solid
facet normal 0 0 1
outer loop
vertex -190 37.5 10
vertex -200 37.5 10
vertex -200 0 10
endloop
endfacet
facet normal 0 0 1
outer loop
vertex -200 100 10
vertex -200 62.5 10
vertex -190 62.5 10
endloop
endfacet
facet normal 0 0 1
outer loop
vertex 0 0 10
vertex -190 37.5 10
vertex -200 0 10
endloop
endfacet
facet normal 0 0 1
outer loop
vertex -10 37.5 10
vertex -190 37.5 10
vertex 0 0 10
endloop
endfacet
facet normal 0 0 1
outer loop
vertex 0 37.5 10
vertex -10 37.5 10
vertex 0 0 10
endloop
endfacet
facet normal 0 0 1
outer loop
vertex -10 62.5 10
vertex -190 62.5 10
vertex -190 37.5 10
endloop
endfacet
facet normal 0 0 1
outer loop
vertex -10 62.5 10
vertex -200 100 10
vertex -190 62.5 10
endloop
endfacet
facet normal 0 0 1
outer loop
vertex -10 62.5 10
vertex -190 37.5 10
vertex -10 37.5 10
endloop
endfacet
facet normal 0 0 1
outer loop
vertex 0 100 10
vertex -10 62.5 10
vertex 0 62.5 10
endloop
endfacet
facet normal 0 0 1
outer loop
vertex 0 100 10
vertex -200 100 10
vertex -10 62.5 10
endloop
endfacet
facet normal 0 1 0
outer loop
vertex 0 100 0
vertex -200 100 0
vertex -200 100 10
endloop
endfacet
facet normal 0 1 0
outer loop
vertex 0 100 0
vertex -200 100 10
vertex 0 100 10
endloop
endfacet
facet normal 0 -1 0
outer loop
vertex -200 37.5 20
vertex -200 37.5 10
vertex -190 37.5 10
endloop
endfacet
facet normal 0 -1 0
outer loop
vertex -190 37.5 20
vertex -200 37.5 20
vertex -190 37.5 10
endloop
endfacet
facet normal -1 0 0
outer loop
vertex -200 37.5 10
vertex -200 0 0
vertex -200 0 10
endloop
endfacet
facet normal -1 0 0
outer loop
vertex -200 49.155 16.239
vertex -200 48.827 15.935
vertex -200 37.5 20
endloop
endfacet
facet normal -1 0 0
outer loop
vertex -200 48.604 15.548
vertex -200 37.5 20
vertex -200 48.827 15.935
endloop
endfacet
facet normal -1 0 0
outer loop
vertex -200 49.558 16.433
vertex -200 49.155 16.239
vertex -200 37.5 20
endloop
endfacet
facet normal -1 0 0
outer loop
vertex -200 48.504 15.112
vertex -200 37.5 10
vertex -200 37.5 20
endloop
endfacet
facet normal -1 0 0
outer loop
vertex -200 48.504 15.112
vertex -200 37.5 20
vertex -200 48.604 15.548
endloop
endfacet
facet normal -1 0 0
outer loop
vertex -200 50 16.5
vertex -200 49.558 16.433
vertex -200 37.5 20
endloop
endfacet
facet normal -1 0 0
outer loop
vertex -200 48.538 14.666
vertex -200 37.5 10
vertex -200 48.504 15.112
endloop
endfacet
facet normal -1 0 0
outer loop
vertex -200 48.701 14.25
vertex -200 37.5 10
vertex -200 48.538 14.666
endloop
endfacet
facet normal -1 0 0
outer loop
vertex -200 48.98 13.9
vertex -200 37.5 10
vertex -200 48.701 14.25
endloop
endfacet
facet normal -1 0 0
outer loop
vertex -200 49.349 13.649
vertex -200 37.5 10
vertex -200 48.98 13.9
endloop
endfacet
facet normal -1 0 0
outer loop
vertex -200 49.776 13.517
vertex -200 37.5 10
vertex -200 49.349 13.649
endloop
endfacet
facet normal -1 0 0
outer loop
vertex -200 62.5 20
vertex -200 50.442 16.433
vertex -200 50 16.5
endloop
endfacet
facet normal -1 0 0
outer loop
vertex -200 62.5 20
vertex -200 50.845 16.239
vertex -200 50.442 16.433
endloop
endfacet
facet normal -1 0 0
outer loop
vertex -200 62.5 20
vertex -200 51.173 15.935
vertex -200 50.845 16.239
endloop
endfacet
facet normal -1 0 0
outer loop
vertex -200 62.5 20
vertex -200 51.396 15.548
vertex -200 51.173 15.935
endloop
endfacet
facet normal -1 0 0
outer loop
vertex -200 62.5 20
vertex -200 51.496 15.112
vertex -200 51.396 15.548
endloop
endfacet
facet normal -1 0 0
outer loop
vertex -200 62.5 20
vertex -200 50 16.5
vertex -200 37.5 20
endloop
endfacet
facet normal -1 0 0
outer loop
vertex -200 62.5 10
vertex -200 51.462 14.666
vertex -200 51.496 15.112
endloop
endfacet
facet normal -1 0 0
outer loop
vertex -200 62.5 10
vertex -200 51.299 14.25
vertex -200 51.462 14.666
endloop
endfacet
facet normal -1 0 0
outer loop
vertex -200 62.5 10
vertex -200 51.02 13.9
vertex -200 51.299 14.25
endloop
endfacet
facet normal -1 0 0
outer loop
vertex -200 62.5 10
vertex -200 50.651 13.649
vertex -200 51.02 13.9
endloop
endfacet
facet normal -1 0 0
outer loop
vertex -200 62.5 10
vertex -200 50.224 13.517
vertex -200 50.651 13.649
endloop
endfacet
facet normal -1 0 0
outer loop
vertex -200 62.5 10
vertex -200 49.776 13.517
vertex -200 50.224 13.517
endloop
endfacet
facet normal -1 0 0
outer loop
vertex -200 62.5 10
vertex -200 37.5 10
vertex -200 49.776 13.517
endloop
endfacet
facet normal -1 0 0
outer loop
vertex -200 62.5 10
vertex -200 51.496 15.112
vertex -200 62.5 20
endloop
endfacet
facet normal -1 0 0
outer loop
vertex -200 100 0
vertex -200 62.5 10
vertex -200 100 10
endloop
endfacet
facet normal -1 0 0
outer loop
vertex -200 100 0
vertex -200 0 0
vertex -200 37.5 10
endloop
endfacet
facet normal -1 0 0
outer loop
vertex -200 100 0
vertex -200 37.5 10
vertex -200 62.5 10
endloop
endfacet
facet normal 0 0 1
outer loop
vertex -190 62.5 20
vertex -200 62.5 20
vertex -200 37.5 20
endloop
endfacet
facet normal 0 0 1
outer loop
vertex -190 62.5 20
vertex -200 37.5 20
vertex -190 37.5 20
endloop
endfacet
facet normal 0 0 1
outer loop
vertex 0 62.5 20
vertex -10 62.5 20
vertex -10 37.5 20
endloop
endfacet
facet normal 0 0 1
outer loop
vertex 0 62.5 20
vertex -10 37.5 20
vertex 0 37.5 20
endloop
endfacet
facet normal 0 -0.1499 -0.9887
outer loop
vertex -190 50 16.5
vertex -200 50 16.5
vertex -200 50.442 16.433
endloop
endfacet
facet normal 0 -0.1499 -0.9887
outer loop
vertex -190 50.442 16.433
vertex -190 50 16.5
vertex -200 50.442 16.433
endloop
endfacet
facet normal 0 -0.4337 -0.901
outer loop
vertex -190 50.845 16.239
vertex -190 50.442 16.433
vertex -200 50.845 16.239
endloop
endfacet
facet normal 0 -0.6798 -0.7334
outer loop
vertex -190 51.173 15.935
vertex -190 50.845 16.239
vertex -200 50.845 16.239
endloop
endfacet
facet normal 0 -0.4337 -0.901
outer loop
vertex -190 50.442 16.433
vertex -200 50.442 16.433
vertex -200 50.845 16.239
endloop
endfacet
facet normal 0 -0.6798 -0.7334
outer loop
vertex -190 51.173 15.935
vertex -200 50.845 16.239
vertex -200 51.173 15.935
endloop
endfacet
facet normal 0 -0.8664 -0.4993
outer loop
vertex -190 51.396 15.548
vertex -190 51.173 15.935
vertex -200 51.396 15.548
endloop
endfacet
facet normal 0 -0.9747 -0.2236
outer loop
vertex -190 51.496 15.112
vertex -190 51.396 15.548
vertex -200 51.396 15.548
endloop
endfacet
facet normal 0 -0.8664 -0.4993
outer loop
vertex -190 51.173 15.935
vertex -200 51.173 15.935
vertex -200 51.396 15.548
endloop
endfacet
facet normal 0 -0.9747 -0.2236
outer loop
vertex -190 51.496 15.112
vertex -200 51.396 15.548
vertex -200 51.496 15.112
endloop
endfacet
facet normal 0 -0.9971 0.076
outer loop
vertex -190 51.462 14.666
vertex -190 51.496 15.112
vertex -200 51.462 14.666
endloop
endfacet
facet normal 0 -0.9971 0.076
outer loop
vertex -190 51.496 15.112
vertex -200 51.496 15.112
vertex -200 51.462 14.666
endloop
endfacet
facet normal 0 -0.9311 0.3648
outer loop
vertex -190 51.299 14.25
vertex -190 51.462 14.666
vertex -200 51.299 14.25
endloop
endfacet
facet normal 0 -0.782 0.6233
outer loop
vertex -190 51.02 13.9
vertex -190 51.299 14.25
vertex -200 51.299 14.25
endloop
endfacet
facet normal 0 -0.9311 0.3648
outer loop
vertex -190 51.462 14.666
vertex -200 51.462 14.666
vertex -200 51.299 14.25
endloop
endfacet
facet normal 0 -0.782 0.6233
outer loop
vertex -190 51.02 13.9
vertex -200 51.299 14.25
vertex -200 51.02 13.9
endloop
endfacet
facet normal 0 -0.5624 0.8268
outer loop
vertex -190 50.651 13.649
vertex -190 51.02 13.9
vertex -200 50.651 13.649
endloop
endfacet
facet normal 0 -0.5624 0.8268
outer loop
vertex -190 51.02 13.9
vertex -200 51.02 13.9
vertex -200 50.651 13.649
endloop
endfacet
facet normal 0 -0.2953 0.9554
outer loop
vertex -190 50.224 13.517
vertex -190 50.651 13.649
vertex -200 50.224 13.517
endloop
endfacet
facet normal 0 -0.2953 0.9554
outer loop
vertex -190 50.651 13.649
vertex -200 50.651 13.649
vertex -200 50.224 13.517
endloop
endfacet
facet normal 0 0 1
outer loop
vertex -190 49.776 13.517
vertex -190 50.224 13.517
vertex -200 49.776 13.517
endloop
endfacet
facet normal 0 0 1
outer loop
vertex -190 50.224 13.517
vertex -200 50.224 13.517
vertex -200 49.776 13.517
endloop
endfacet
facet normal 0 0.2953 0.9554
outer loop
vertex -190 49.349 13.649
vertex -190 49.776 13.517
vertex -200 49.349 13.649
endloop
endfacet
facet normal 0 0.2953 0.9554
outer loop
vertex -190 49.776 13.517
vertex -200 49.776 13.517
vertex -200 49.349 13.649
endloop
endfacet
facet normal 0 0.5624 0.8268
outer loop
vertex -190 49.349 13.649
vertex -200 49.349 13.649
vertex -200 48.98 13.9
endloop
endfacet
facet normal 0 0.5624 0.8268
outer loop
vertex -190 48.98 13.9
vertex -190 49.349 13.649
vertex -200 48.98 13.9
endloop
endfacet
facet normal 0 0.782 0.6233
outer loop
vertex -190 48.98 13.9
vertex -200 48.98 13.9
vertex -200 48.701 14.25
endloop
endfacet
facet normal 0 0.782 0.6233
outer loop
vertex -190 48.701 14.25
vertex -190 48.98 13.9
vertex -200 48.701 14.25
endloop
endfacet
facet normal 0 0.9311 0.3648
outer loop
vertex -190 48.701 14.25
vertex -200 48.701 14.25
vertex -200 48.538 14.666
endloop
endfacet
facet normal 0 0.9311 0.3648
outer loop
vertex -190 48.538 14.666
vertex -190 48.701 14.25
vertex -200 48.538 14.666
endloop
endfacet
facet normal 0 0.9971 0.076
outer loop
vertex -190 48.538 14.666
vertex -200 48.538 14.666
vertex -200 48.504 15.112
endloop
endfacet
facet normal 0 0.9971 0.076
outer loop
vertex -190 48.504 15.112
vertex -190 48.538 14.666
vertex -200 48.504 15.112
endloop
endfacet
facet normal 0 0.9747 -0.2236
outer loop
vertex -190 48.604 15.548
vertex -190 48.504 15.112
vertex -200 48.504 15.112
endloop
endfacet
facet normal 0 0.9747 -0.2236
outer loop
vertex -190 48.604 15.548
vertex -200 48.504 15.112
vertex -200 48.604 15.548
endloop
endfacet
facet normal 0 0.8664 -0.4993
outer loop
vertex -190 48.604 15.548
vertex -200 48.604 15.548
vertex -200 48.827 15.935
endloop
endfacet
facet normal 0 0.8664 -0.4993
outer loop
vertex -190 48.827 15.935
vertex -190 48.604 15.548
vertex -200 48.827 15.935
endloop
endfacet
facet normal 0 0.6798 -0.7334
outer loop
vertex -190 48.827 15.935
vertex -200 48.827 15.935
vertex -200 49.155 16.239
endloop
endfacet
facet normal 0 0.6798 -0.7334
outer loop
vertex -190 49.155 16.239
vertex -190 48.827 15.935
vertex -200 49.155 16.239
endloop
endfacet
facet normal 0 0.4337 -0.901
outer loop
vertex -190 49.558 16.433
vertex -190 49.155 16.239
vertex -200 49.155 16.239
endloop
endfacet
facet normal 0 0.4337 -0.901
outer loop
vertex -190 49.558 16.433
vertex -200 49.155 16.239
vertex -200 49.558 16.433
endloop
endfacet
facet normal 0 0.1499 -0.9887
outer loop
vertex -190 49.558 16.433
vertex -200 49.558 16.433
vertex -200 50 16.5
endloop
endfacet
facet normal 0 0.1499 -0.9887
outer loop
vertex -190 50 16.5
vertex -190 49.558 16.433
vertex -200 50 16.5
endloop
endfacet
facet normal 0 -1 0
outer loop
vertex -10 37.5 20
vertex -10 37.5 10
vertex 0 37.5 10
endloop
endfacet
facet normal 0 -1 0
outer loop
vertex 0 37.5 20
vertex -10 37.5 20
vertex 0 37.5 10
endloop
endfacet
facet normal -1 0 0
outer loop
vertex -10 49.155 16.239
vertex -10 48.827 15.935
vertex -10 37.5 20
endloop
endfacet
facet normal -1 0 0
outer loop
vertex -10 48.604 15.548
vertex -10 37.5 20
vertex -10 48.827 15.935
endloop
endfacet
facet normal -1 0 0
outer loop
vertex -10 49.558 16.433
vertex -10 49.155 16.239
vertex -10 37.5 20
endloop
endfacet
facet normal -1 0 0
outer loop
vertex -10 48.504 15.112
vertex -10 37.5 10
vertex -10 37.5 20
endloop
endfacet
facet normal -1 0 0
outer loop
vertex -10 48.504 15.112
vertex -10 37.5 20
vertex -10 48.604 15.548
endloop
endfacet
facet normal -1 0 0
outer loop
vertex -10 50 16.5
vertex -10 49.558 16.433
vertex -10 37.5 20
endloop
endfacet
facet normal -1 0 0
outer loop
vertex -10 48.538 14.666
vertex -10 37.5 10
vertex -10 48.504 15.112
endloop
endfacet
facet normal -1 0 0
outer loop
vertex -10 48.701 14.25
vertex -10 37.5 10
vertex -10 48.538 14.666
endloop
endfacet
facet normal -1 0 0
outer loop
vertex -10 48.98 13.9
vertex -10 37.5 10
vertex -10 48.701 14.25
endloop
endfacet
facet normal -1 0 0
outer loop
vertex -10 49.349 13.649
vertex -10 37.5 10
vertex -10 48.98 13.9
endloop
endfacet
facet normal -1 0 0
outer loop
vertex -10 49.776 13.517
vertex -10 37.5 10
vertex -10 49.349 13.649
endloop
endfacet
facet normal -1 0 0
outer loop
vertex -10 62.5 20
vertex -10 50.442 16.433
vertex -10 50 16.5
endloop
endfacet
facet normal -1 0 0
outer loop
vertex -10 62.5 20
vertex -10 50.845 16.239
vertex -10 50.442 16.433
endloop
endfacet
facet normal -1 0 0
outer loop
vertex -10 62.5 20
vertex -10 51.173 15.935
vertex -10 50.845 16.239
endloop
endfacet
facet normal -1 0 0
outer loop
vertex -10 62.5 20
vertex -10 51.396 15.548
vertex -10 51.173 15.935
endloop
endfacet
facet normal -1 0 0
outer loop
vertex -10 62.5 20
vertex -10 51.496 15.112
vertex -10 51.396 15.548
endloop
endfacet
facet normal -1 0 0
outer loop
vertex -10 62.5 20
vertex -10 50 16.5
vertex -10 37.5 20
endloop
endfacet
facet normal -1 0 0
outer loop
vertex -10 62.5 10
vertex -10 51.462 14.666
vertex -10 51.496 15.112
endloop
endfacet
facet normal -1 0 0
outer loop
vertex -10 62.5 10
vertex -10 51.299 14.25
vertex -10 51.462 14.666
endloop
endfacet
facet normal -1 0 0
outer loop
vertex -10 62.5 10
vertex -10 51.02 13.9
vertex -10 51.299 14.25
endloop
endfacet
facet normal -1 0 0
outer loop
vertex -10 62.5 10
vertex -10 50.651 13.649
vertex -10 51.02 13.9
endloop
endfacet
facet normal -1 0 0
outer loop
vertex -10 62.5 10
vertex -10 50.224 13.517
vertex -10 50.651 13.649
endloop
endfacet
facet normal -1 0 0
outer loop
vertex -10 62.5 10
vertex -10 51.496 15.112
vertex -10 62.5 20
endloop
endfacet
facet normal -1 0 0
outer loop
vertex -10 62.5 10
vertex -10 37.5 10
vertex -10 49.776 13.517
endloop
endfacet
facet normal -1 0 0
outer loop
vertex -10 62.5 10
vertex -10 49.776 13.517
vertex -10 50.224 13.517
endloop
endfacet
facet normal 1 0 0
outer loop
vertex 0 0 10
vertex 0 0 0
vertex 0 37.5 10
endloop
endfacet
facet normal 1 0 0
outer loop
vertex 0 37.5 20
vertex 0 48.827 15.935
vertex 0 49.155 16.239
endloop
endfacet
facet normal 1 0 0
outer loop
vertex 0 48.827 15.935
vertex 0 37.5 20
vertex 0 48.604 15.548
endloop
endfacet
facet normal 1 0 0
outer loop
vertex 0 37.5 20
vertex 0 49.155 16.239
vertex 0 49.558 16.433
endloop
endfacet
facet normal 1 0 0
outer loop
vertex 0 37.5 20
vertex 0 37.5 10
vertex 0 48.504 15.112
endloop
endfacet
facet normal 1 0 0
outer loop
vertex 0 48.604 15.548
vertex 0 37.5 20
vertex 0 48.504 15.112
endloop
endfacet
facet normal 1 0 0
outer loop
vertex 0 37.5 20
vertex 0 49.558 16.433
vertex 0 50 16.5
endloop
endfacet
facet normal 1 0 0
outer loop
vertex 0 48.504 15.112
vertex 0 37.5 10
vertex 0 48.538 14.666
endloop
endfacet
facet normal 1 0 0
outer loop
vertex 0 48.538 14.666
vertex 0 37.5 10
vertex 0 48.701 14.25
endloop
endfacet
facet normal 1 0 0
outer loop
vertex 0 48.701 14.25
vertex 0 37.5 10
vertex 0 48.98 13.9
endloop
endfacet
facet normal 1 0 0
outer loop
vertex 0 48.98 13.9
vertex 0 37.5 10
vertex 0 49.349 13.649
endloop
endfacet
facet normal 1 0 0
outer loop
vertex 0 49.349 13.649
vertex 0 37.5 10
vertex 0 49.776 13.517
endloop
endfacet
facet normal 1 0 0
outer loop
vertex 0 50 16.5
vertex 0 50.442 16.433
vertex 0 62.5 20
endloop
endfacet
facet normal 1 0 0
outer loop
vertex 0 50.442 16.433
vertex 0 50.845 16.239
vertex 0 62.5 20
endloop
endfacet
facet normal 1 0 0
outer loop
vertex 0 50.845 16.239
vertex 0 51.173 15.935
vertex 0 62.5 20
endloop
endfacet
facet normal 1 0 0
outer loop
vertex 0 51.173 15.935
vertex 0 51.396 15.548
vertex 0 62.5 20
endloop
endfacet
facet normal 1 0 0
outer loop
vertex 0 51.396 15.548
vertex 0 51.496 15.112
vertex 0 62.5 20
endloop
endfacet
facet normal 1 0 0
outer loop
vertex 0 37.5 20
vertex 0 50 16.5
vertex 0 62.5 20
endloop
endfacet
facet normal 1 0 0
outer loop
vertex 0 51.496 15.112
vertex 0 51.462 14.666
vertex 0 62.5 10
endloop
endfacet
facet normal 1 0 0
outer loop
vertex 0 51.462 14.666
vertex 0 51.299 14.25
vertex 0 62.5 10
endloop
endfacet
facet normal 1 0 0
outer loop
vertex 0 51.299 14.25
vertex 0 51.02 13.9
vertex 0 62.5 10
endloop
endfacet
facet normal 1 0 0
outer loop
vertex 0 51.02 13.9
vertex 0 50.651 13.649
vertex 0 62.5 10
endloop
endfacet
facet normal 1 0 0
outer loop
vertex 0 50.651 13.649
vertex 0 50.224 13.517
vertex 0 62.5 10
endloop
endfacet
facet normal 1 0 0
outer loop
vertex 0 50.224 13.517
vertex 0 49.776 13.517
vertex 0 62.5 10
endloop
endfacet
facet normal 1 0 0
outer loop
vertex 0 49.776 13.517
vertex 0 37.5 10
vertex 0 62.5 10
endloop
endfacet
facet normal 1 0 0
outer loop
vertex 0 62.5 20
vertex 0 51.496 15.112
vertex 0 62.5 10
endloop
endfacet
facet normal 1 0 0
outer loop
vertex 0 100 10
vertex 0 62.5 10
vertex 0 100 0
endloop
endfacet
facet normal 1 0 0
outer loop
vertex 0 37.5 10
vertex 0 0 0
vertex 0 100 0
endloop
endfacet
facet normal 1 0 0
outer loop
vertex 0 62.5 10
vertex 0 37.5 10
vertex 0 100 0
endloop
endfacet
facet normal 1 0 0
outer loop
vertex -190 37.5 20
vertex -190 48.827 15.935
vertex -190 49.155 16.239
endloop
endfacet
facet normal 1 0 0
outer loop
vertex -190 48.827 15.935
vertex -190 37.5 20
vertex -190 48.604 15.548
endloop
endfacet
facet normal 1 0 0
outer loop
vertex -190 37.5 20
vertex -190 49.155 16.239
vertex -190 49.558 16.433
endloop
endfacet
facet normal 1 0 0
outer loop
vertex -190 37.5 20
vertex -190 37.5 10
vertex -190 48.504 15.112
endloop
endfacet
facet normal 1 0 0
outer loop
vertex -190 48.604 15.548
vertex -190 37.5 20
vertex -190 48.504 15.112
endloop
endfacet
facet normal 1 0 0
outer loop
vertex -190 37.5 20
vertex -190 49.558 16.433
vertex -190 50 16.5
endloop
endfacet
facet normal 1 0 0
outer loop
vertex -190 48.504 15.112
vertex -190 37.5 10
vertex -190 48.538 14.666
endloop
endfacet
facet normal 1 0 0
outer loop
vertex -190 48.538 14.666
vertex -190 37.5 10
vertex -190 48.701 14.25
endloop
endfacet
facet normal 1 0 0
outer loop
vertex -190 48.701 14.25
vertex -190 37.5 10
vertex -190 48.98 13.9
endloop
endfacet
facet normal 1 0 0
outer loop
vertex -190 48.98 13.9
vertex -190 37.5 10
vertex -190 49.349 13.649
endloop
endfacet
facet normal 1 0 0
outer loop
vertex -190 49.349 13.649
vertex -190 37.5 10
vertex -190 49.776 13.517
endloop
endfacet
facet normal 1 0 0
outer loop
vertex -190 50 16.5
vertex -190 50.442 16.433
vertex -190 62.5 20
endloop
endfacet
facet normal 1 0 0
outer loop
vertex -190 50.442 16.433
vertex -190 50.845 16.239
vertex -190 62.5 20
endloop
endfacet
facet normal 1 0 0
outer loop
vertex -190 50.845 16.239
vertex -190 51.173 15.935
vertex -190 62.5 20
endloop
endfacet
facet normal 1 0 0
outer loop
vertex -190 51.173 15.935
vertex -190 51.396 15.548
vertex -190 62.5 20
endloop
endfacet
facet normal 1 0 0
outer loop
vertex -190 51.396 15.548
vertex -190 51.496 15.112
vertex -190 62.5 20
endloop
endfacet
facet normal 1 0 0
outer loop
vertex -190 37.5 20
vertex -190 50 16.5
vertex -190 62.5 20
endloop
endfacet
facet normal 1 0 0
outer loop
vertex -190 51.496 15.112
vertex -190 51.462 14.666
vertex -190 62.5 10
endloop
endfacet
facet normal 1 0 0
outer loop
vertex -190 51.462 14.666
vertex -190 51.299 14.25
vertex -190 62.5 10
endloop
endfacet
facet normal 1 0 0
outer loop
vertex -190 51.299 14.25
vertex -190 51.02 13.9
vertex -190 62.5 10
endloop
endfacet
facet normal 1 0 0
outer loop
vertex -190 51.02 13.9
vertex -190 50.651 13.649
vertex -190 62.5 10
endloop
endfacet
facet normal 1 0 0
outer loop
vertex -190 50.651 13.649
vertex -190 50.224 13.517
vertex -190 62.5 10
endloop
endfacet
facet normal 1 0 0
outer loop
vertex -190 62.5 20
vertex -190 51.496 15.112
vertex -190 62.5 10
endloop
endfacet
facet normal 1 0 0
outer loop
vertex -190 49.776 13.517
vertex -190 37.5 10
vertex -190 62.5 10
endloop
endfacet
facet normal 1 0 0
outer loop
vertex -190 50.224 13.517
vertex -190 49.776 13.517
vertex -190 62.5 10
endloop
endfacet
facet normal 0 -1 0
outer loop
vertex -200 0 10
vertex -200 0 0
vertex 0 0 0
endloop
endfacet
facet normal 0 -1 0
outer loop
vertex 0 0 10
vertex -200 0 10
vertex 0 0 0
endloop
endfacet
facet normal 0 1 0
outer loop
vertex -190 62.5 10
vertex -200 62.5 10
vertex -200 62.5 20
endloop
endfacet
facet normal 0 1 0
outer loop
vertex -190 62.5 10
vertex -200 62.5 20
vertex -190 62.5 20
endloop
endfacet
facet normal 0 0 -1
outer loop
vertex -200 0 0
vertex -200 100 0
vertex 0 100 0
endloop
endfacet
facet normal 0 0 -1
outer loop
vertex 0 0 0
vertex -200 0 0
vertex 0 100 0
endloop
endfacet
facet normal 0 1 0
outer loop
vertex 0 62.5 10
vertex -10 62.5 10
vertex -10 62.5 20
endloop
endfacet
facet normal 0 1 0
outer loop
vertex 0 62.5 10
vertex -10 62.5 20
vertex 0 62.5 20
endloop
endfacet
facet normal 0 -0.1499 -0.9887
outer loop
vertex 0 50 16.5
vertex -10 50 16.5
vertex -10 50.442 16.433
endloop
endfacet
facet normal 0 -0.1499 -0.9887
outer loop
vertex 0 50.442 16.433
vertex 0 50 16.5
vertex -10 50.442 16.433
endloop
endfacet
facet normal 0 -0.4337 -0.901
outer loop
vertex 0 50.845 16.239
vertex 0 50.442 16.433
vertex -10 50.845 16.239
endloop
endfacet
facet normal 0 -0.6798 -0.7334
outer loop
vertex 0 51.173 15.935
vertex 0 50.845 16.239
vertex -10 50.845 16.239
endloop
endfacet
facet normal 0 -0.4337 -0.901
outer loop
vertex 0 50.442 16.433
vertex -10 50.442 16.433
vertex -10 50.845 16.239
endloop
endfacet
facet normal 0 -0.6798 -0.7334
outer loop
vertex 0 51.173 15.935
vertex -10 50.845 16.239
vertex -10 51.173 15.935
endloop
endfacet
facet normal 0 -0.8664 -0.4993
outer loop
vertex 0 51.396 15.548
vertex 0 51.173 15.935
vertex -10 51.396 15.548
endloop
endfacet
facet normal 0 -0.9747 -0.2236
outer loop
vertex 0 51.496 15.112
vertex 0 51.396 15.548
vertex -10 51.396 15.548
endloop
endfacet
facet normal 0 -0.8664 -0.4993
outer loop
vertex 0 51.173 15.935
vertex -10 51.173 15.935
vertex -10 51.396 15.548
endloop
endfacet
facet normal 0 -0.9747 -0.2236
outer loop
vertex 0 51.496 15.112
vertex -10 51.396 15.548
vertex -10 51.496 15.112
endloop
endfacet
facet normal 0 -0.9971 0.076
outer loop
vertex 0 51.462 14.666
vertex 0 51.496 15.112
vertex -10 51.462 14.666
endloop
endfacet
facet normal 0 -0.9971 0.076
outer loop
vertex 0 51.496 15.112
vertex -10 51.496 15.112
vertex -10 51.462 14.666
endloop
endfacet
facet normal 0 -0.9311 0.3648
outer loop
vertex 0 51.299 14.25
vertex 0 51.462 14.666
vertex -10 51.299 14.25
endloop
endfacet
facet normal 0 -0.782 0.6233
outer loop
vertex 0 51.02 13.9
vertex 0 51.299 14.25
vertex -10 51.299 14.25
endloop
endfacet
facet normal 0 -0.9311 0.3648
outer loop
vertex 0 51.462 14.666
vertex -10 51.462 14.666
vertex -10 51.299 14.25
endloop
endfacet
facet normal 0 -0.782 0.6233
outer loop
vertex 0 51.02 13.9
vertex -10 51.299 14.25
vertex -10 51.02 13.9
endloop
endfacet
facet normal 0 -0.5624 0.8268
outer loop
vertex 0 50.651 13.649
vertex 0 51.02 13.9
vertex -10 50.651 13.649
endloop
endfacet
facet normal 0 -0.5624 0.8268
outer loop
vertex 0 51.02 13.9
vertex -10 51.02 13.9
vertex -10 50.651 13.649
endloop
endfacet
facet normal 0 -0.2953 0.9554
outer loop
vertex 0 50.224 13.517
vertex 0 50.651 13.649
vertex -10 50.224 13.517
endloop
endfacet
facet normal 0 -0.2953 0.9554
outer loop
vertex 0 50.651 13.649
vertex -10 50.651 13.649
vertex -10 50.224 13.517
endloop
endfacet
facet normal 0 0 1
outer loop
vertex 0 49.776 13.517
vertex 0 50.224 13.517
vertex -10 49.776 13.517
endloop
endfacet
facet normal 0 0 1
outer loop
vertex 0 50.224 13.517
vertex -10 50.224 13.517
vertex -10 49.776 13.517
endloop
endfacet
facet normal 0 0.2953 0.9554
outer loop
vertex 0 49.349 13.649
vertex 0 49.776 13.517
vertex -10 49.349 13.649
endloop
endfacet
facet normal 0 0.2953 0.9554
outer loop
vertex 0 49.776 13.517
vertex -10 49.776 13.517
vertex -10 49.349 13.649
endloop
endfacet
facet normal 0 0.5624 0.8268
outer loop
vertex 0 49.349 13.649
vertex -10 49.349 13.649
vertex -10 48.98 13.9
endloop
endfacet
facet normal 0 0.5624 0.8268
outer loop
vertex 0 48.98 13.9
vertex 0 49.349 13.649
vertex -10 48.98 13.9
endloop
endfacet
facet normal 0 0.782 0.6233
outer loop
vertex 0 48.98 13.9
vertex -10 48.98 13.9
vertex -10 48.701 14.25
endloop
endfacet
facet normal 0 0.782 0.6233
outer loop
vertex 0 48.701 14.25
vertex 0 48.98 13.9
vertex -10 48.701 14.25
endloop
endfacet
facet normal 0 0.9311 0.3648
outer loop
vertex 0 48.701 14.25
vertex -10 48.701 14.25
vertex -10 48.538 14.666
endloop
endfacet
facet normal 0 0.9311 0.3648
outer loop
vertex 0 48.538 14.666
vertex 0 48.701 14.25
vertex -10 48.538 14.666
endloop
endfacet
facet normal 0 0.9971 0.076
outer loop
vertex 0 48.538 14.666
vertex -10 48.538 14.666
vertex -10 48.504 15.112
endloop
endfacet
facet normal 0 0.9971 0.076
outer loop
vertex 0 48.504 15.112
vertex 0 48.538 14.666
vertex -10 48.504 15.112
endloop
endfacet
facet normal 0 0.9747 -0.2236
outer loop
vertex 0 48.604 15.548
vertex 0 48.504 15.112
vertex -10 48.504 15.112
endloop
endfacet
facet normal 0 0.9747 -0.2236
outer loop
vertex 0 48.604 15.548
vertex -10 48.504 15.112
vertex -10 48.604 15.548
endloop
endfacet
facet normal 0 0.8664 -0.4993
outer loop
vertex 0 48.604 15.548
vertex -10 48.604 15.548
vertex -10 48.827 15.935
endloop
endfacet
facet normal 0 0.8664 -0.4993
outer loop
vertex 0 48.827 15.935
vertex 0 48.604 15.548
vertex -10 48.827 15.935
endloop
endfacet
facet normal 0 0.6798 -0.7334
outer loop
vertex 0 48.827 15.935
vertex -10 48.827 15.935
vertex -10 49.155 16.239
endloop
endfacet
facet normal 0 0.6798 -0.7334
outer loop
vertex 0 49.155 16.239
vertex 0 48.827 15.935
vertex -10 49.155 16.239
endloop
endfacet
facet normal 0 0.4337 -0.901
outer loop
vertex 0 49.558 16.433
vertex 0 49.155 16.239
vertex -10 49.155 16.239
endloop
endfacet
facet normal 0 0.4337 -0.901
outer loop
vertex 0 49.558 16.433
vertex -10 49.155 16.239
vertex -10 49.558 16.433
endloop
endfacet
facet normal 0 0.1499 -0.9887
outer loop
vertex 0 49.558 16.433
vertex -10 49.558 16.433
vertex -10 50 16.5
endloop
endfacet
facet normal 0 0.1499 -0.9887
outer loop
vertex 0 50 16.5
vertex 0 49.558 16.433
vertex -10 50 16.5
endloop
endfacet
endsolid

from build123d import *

# Parameters (mm, degrees)
ESQUISSE1_W             = 200
ESQUISSE1_H             = 100
BOSS_EXTRU_1_DEPTH      = 10
ESQUISSE2_W             = 10
ESQUISSE2_H             = 25
BOSS_EXTRU_2_DEPTH      = 10
ESQUISSE3_R             = 1.5
ENL_V_MAT_EXTRU_1_DEPTH = 201


with BuildPart() as part:
    # Esquisse1 → Boss.-Extru.1 (new body)
    with BuildSketch(Plane.XY):
        with Locations((-100, 50)):
            Rectangle(ESQUISSE1_W, ESQUISSE1_H)
    extrude(amount=BOSS_EXTRU_1_DEPTH)

    # Esquisse2 → Boss.-Extru.2 (add)
    with BuildSketch(Plane.XY.offset(10)):
        with Locations((-195, 50)):
            Rectangle(ESQUISSE2_W, ESQUISSE2_H)
        with Locations((-5, 50)):
            Rectangle(ESQUISSE2_W, ESQUISSE2_H)
    extrude(amount=BOSS_EXTRU_2_DEPTH)

    # Esquisse3 → Enlèv. mat.-Extru.1 (cut, through all)
    with BuildSketch(Plane.ZY.offset(200)):
        with Locations((15, 50)):
            Circle(ESQUISSE3_R)
    extrude(amount=-ENL_V_MAT_EXTRU_1_DEPTH, mode=Mode.SUBTRACT)


solid = part.part
